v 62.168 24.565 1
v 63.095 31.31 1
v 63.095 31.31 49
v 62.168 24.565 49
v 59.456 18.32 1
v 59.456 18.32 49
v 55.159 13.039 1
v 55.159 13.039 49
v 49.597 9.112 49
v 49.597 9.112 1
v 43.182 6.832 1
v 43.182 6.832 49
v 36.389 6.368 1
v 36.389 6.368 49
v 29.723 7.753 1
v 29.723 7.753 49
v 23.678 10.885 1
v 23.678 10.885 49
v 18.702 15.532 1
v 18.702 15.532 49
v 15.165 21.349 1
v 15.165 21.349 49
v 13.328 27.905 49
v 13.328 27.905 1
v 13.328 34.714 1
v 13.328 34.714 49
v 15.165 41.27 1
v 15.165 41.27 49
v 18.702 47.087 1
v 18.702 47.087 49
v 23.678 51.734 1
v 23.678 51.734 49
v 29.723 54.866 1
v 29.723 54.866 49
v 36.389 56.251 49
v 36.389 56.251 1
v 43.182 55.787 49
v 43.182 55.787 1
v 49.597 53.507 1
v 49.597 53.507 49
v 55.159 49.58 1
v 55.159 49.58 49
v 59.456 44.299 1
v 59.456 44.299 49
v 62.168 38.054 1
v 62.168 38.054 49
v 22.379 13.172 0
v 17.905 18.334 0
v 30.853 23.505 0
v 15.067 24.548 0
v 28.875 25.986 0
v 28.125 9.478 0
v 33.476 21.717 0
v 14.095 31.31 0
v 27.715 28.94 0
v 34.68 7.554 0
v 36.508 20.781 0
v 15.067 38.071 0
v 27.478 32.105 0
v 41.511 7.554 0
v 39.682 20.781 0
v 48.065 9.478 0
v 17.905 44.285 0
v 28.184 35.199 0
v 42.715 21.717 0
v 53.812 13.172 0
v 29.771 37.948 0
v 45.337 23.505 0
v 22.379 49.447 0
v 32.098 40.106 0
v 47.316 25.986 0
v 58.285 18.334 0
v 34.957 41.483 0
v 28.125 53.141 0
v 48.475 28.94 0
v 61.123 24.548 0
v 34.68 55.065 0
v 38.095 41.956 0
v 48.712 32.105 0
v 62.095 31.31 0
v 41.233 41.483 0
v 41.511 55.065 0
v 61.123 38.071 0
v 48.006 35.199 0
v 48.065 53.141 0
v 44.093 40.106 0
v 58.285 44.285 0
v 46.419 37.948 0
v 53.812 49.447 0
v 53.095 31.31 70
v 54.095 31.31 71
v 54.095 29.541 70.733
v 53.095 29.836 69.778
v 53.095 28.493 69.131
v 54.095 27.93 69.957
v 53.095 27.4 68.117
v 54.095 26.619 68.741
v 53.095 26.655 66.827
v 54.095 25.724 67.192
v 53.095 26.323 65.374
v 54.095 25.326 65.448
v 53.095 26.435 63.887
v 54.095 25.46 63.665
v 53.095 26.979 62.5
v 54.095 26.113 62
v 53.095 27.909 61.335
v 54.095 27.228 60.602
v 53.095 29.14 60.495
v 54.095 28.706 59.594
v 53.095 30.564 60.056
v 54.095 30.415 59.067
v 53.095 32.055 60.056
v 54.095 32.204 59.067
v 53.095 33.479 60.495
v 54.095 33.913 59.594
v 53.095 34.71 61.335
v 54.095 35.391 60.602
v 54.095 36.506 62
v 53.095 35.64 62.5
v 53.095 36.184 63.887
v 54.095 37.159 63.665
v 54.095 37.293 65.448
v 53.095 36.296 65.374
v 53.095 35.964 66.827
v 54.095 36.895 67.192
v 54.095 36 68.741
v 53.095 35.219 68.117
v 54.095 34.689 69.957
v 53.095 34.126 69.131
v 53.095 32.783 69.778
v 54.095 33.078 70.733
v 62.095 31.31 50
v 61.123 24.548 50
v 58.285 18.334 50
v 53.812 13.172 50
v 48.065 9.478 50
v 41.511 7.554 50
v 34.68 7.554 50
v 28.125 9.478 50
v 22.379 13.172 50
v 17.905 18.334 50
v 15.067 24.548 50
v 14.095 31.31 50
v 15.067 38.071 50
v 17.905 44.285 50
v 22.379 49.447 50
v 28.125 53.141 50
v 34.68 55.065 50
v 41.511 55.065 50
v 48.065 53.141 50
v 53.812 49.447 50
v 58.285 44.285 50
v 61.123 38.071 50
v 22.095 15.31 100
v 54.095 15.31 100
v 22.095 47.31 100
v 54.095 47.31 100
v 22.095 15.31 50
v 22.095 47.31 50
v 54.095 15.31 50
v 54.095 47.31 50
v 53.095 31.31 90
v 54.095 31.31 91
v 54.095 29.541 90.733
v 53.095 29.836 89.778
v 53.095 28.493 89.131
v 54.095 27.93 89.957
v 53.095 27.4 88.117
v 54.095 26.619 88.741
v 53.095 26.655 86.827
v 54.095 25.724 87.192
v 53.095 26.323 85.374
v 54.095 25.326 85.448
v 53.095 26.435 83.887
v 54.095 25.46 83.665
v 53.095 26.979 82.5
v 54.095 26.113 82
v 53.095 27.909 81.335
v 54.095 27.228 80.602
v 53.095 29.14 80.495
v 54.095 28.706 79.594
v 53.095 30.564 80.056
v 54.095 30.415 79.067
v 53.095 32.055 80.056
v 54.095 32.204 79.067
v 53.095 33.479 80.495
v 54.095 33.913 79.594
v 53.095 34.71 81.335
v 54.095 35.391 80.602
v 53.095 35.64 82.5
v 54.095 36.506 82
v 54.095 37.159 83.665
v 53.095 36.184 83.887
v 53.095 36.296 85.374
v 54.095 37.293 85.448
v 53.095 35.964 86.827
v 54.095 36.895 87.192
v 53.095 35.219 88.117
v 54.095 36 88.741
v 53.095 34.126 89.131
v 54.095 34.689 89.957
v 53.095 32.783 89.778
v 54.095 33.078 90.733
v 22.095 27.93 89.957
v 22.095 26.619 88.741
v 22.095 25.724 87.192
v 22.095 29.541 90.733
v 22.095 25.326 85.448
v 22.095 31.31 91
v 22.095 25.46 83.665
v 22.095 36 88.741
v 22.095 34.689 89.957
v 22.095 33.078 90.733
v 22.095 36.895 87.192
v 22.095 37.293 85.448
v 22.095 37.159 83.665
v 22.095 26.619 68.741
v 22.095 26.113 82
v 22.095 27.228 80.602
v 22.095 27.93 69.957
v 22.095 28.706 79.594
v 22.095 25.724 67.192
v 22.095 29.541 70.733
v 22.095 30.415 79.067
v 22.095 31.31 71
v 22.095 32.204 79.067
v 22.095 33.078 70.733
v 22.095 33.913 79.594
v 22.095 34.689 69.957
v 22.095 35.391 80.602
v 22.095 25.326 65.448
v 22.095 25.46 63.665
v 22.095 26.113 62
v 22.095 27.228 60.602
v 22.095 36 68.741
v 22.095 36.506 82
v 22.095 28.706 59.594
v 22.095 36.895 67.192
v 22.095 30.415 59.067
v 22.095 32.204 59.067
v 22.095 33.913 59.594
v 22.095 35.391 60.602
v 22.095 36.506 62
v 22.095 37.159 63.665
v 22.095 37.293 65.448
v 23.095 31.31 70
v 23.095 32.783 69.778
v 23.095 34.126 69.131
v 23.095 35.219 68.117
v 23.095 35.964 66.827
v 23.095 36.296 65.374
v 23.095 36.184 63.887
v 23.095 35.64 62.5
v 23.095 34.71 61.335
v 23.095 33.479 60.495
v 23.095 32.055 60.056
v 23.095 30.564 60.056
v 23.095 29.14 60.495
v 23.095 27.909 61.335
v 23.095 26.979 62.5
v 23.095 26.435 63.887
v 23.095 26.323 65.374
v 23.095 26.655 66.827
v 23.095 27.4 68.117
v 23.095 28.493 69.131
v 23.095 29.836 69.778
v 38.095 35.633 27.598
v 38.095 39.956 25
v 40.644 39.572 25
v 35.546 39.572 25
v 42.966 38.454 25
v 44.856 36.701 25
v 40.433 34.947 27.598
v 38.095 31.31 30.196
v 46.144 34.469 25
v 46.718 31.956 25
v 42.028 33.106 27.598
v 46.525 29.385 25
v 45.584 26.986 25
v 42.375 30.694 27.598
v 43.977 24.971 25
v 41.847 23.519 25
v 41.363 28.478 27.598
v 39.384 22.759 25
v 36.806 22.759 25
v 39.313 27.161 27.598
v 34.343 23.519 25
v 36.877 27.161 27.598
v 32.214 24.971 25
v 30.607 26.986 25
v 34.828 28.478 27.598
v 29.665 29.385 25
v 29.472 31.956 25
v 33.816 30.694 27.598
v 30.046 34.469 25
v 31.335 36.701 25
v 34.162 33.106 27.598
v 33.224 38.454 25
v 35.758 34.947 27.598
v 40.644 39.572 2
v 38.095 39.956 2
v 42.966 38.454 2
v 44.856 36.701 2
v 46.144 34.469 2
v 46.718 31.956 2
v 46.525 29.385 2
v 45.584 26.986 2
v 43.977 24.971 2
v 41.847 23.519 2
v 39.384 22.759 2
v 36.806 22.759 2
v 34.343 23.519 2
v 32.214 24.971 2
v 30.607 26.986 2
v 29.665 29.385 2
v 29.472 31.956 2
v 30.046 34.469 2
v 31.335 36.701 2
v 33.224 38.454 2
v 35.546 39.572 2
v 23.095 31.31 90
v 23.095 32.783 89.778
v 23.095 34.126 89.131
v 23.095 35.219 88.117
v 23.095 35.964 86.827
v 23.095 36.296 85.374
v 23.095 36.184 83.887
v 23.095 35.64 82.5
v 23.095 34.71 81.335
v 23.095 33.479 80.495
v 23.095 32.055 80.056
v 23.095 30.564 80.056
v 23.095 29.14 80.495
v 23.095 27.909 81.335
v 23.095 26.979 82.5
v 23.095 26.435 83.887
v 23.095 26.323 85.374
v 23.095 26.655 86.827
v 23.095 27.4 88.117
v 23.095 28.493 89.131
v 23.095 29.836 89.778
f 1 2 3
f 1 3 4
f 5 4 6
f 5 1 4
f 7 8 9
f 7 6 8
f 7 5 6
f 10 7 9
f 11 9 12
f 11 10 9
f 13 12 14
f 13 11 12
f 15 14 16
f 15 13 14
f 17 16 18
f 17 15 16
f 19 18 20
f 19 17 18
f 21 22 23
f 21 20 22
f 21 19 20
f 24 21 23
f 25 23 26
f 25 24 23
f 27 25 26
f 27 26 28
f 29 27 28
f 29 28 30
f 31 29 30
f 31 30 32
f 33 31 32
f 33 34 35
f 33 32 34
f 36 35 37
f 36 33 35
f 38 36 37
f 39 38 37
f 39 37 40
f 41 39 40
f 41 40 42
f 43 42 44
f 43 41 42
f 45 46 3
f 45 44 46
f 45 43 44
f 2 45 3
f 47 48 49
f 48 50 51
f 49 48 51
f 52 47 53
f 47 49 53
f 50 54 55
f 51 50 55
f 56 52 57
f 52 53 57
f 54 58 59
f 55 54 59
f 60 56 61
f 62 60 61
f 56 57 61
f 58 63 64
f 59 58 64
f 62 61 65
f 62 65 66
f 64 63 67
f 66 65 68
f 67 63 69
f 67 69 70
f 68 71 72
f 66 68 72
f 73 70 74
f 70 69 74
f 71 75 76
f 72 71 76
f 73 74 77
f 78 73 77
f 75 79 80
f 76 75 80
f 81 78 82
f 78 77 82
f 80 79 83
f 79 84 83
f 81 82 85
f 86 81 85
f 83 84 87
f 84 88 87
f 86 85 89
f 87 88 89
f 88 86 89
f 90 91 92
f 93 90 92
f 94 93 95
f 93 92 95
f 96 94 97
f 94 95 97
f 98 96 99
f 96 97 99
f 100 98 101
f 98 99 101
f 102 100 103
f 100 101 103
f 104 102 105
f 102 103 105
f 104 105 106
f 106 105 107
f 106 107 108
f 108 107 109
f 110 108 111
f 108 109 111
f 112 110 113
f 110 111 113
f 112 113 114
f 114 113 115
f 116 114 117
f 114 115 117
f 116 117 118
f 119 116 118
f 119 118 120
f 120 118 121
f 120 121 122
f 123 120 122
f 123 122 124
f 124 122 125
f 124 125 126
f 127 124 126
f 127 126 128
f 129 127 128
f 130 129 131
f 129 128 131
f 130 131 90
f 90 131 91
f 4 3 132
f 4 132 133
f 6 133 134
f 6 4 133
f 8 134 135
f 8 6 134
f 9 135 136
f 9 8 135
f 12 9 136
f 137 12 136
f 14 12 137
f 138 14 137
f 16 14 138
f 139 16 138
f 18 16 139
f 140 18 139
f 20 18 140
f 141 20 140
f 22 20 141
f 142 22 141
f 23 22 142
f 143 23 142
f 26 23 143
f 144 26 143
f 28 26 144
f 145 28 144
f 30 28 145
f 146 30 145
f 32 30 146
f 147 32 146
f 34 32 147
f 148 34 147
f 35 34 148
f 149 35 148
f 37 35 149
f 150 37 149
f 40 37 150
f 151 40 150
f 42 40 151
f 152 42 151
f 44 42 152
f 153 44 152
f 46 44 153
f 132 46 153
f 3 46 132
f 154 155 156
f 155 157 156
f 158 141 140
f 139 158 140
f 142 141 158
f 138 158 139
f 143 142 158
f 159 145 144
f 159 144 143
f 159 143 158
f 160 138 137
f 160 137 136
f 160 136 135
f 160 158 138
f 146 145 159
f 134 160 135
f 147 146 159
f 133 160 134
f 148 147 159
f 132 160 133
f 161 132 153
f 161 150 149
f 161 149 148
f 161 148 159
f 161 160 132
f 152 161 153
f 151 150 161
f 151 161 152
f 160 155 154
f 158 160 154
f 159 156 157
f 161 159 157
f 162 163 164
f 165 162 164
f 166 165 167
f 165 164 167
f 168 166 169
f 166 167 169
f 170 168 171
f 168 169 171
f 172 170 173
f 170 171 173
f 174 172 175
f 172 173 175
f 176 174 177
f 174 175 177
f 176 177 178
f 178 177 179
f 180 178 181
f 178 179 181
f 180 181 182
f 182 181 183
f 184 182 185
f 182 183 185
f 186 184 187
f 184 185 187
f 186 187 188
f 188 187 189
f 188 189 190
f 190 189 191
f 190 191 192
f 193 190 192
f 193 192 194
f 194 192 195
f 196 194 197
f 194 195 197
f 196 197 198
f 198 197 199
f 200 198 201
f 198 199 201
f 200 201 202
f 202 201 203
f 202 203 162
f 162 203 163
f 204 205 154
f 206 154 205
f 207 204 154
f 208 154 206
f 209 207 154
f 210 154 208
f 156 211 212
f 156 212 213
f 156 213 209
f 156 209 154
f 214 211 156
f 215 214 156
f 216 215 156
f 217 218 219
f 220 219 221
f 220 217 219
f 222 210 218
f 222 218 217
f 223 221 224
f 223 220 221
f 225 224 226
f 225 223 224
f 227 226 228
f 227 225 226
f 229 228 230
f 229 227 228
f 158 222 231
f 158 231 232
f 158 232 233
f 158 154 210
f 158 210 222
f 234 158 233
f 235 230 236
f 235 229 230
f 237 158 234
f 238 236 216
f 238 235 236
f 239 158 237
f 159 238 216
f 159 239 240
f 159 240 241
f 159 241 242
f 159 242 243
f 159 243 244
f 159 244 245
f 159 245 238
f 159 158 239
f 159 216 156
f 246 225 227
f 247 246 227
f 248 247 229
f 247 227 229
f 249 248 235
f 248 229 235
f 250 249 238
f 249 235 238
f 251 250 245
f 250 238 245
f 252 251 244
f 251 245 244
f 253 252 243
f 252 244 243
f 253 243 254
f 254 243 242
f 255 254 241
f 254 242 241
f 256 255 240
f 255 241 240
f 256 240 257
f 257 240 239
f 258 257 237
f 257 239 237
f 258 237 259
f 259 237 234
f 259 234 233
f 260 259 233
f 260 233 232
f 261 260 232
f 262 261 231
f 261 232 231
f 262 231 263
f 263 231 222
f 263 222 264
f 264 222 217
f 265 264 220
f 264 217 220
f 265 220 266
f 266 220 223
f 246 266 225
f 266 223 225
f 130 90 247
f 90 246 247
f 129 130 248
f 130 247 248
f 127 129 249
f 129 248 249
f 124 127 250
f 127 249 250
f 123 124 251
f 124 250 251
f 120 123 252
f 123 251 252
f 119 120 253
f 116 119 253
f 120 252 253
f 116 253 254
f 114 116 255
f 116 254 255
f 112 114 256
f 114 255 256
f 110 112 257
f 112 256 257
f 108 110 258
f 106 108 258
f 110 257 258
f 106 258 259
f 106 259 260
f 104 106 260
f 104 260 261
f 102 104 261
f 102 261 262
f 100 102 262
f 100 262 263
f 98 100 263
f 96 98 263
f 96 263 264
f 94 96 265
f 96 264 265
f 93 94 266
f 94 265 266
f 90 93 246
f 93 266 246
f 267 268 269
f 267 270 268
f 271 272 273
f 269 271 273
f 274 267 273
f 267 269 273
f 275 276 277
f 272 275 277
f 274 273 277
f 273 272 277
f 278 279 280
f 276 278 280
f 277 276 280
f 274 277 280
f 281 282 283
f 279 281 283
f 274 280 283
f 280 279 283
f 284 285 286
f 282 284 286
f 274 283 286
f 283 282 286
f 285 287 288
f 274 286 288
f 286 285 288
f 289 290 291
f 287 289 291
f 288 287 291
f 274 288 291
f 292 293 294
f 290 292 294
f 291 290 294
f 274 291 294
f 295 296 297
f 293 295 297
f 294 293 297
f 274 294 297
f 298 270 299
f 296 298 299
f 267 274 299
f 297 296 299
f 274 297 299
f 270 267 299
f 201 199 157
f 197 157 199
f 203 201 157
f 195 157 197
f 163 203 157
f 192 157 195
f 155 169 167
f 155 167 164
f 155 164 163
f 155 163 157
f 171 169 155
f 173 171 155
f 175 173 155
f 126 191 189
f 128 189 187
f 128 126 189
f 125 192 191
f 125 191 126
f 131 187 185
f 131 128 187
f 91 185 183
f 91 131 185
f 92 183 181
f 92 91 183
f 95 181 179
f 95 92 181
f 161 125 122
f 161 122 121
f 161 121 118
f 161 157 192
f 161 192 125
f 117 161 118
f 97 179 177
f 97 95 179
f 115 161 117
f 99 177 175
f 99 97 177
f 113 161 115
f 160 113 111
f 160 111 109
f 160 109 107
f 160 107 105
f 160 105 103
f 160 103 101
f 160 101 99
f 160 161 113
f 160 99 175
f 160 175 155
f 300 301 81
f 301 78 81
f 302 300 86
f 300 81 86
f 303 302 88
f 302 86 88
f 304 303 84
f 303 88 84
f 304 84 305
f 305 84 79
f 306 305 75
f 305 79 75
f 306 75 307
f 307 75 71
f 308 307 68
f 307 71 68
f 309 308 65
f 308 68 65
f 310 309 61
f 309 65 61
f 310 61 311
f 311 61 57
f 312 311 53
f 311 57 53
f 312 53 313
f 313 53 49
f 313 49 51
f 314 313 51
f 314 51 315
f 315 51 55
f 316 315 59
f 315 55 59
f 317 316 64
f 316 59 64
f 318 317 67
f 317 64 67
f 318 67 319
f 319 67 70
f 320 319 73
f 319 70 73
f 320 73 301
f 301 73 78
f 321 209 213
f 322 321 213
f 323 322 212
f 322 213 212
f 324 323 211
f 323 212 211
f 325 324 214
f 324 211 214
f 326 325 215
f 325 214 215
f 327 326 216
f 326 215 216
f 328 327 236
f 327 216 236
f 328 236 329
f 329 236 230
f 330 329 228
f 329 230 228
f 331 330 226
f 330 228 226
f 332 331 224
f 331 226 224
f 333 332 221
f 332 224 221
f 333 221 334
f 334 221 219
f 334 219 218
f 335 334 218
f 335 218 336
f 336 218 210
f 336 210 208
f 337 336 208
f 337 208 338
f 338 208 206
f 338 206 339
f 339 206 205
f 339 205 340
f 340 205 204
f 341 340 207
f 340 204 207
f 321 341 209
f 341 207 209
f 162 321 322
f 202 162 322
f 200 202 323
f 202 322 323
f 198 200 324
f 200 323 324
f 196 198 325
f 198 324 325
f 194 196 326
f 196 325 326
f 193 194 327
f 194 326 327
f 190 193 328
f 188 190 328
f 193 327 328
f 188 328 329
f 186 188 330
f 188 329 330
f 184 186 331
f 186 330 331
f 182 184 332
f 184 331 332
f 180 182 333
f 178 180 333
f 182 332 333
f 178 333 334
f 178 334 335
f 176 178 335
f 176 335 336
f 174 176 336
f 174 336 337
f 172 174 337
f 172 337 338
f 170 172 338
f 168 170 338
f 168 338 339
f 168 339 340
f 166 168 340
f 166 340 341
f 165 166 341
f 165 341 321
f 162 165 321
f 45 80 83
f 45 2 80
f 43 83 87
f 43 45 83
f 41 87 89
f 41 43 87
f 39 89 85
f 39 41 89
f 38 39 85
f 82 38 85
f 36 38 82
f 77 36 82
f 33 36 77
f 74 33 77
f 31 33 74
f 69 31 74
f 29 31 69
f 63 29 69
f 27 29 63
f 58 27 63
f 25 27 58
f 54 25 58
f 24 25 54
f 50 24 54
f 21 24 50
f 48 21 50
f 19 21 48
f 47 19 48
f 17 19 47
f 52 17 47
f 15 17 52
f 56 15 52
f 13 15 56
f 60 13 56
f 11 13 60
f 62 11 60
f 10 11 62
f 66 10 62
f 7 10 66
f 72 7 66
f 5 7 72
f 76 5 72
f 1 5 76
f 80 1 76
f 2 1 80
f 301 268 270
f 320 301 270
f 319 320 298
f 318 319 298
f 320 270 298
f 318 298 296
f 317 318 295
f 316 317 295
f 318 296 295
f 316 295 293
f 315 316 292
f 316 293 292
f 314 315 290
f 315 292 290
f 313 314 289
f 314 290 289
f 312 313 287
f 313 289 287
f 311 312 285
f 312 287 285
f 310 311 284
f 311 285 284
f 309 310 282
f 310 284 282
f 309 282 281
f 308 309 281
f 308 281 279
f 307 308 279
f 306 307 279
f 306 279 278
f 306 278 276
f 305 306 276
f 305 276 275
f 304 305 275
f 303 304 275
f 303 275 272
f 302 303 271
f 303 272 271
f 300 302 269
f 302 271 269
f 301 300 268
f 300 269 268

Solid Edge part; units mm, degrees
sketch "Sketch1" plane through (0, 0, 0) normal (0, 0, 1) x (1, 0, 0)
  circle A0 centre (38.0952, 31.3095) radius 25
extrude "Protrusion1" add sketch "Sketch1" along normal blind 50
sketch "Sketch2" plane through (38.0952, 31.3095, 50) normal (0, 0, 1) x (1, 0, 0)
  line L0 (-16, 16) -> (16, 16)
  line L1 (16, 16) -> (16, -16)
  line L2 (16, -16) -> (-16, -16)
  line L3 (-16, -16) -> (-16, 16)
  dimension "D1" = 32
  dimension "D2" = 32
  dimension "D3" = 16
  dimension "D4" = 16
extrude "ExtrudedProtrusion_2" add sketch "Sketch2" along normal blind 50
hole "Hole_1" at (22.0952, 31.3095, 85) direction (1, 0, 0) diameter 10 end through all
hole "Hole1" at (22.0952, 31.3095, 65) direction (1, 0, 0) diameter 10 end through all
hole "Hole_2" at (38.0952, 31.3095, 0) direction (0, 0, 1) diameter 17.294 depth 25 tip angle 118 thread major 20 thread length 20
chamfer "Chamfer_1" distance 2 angle 45 1 edges at (38.0952, 22.6625, 0)
chamfer "Chamfer_2" distance 1 angle 45 1 edges at (13.0952, 31.3095, 0)
chamfer "Chamfer_3" distance 1 angle 45 1 edges at (13.0952, 31.3095, 50)
chamfer "Chamfer_4" distance 1 angle 45 2 edges at (22.0952, 31.3095, 80) (54.0952, 26.3095, 85)
chamfer "Chamfer_5" distance 1 angle 45 2 edges at (22.0952, 31.3095, 60) (54.0952, 26.3095, 65)
